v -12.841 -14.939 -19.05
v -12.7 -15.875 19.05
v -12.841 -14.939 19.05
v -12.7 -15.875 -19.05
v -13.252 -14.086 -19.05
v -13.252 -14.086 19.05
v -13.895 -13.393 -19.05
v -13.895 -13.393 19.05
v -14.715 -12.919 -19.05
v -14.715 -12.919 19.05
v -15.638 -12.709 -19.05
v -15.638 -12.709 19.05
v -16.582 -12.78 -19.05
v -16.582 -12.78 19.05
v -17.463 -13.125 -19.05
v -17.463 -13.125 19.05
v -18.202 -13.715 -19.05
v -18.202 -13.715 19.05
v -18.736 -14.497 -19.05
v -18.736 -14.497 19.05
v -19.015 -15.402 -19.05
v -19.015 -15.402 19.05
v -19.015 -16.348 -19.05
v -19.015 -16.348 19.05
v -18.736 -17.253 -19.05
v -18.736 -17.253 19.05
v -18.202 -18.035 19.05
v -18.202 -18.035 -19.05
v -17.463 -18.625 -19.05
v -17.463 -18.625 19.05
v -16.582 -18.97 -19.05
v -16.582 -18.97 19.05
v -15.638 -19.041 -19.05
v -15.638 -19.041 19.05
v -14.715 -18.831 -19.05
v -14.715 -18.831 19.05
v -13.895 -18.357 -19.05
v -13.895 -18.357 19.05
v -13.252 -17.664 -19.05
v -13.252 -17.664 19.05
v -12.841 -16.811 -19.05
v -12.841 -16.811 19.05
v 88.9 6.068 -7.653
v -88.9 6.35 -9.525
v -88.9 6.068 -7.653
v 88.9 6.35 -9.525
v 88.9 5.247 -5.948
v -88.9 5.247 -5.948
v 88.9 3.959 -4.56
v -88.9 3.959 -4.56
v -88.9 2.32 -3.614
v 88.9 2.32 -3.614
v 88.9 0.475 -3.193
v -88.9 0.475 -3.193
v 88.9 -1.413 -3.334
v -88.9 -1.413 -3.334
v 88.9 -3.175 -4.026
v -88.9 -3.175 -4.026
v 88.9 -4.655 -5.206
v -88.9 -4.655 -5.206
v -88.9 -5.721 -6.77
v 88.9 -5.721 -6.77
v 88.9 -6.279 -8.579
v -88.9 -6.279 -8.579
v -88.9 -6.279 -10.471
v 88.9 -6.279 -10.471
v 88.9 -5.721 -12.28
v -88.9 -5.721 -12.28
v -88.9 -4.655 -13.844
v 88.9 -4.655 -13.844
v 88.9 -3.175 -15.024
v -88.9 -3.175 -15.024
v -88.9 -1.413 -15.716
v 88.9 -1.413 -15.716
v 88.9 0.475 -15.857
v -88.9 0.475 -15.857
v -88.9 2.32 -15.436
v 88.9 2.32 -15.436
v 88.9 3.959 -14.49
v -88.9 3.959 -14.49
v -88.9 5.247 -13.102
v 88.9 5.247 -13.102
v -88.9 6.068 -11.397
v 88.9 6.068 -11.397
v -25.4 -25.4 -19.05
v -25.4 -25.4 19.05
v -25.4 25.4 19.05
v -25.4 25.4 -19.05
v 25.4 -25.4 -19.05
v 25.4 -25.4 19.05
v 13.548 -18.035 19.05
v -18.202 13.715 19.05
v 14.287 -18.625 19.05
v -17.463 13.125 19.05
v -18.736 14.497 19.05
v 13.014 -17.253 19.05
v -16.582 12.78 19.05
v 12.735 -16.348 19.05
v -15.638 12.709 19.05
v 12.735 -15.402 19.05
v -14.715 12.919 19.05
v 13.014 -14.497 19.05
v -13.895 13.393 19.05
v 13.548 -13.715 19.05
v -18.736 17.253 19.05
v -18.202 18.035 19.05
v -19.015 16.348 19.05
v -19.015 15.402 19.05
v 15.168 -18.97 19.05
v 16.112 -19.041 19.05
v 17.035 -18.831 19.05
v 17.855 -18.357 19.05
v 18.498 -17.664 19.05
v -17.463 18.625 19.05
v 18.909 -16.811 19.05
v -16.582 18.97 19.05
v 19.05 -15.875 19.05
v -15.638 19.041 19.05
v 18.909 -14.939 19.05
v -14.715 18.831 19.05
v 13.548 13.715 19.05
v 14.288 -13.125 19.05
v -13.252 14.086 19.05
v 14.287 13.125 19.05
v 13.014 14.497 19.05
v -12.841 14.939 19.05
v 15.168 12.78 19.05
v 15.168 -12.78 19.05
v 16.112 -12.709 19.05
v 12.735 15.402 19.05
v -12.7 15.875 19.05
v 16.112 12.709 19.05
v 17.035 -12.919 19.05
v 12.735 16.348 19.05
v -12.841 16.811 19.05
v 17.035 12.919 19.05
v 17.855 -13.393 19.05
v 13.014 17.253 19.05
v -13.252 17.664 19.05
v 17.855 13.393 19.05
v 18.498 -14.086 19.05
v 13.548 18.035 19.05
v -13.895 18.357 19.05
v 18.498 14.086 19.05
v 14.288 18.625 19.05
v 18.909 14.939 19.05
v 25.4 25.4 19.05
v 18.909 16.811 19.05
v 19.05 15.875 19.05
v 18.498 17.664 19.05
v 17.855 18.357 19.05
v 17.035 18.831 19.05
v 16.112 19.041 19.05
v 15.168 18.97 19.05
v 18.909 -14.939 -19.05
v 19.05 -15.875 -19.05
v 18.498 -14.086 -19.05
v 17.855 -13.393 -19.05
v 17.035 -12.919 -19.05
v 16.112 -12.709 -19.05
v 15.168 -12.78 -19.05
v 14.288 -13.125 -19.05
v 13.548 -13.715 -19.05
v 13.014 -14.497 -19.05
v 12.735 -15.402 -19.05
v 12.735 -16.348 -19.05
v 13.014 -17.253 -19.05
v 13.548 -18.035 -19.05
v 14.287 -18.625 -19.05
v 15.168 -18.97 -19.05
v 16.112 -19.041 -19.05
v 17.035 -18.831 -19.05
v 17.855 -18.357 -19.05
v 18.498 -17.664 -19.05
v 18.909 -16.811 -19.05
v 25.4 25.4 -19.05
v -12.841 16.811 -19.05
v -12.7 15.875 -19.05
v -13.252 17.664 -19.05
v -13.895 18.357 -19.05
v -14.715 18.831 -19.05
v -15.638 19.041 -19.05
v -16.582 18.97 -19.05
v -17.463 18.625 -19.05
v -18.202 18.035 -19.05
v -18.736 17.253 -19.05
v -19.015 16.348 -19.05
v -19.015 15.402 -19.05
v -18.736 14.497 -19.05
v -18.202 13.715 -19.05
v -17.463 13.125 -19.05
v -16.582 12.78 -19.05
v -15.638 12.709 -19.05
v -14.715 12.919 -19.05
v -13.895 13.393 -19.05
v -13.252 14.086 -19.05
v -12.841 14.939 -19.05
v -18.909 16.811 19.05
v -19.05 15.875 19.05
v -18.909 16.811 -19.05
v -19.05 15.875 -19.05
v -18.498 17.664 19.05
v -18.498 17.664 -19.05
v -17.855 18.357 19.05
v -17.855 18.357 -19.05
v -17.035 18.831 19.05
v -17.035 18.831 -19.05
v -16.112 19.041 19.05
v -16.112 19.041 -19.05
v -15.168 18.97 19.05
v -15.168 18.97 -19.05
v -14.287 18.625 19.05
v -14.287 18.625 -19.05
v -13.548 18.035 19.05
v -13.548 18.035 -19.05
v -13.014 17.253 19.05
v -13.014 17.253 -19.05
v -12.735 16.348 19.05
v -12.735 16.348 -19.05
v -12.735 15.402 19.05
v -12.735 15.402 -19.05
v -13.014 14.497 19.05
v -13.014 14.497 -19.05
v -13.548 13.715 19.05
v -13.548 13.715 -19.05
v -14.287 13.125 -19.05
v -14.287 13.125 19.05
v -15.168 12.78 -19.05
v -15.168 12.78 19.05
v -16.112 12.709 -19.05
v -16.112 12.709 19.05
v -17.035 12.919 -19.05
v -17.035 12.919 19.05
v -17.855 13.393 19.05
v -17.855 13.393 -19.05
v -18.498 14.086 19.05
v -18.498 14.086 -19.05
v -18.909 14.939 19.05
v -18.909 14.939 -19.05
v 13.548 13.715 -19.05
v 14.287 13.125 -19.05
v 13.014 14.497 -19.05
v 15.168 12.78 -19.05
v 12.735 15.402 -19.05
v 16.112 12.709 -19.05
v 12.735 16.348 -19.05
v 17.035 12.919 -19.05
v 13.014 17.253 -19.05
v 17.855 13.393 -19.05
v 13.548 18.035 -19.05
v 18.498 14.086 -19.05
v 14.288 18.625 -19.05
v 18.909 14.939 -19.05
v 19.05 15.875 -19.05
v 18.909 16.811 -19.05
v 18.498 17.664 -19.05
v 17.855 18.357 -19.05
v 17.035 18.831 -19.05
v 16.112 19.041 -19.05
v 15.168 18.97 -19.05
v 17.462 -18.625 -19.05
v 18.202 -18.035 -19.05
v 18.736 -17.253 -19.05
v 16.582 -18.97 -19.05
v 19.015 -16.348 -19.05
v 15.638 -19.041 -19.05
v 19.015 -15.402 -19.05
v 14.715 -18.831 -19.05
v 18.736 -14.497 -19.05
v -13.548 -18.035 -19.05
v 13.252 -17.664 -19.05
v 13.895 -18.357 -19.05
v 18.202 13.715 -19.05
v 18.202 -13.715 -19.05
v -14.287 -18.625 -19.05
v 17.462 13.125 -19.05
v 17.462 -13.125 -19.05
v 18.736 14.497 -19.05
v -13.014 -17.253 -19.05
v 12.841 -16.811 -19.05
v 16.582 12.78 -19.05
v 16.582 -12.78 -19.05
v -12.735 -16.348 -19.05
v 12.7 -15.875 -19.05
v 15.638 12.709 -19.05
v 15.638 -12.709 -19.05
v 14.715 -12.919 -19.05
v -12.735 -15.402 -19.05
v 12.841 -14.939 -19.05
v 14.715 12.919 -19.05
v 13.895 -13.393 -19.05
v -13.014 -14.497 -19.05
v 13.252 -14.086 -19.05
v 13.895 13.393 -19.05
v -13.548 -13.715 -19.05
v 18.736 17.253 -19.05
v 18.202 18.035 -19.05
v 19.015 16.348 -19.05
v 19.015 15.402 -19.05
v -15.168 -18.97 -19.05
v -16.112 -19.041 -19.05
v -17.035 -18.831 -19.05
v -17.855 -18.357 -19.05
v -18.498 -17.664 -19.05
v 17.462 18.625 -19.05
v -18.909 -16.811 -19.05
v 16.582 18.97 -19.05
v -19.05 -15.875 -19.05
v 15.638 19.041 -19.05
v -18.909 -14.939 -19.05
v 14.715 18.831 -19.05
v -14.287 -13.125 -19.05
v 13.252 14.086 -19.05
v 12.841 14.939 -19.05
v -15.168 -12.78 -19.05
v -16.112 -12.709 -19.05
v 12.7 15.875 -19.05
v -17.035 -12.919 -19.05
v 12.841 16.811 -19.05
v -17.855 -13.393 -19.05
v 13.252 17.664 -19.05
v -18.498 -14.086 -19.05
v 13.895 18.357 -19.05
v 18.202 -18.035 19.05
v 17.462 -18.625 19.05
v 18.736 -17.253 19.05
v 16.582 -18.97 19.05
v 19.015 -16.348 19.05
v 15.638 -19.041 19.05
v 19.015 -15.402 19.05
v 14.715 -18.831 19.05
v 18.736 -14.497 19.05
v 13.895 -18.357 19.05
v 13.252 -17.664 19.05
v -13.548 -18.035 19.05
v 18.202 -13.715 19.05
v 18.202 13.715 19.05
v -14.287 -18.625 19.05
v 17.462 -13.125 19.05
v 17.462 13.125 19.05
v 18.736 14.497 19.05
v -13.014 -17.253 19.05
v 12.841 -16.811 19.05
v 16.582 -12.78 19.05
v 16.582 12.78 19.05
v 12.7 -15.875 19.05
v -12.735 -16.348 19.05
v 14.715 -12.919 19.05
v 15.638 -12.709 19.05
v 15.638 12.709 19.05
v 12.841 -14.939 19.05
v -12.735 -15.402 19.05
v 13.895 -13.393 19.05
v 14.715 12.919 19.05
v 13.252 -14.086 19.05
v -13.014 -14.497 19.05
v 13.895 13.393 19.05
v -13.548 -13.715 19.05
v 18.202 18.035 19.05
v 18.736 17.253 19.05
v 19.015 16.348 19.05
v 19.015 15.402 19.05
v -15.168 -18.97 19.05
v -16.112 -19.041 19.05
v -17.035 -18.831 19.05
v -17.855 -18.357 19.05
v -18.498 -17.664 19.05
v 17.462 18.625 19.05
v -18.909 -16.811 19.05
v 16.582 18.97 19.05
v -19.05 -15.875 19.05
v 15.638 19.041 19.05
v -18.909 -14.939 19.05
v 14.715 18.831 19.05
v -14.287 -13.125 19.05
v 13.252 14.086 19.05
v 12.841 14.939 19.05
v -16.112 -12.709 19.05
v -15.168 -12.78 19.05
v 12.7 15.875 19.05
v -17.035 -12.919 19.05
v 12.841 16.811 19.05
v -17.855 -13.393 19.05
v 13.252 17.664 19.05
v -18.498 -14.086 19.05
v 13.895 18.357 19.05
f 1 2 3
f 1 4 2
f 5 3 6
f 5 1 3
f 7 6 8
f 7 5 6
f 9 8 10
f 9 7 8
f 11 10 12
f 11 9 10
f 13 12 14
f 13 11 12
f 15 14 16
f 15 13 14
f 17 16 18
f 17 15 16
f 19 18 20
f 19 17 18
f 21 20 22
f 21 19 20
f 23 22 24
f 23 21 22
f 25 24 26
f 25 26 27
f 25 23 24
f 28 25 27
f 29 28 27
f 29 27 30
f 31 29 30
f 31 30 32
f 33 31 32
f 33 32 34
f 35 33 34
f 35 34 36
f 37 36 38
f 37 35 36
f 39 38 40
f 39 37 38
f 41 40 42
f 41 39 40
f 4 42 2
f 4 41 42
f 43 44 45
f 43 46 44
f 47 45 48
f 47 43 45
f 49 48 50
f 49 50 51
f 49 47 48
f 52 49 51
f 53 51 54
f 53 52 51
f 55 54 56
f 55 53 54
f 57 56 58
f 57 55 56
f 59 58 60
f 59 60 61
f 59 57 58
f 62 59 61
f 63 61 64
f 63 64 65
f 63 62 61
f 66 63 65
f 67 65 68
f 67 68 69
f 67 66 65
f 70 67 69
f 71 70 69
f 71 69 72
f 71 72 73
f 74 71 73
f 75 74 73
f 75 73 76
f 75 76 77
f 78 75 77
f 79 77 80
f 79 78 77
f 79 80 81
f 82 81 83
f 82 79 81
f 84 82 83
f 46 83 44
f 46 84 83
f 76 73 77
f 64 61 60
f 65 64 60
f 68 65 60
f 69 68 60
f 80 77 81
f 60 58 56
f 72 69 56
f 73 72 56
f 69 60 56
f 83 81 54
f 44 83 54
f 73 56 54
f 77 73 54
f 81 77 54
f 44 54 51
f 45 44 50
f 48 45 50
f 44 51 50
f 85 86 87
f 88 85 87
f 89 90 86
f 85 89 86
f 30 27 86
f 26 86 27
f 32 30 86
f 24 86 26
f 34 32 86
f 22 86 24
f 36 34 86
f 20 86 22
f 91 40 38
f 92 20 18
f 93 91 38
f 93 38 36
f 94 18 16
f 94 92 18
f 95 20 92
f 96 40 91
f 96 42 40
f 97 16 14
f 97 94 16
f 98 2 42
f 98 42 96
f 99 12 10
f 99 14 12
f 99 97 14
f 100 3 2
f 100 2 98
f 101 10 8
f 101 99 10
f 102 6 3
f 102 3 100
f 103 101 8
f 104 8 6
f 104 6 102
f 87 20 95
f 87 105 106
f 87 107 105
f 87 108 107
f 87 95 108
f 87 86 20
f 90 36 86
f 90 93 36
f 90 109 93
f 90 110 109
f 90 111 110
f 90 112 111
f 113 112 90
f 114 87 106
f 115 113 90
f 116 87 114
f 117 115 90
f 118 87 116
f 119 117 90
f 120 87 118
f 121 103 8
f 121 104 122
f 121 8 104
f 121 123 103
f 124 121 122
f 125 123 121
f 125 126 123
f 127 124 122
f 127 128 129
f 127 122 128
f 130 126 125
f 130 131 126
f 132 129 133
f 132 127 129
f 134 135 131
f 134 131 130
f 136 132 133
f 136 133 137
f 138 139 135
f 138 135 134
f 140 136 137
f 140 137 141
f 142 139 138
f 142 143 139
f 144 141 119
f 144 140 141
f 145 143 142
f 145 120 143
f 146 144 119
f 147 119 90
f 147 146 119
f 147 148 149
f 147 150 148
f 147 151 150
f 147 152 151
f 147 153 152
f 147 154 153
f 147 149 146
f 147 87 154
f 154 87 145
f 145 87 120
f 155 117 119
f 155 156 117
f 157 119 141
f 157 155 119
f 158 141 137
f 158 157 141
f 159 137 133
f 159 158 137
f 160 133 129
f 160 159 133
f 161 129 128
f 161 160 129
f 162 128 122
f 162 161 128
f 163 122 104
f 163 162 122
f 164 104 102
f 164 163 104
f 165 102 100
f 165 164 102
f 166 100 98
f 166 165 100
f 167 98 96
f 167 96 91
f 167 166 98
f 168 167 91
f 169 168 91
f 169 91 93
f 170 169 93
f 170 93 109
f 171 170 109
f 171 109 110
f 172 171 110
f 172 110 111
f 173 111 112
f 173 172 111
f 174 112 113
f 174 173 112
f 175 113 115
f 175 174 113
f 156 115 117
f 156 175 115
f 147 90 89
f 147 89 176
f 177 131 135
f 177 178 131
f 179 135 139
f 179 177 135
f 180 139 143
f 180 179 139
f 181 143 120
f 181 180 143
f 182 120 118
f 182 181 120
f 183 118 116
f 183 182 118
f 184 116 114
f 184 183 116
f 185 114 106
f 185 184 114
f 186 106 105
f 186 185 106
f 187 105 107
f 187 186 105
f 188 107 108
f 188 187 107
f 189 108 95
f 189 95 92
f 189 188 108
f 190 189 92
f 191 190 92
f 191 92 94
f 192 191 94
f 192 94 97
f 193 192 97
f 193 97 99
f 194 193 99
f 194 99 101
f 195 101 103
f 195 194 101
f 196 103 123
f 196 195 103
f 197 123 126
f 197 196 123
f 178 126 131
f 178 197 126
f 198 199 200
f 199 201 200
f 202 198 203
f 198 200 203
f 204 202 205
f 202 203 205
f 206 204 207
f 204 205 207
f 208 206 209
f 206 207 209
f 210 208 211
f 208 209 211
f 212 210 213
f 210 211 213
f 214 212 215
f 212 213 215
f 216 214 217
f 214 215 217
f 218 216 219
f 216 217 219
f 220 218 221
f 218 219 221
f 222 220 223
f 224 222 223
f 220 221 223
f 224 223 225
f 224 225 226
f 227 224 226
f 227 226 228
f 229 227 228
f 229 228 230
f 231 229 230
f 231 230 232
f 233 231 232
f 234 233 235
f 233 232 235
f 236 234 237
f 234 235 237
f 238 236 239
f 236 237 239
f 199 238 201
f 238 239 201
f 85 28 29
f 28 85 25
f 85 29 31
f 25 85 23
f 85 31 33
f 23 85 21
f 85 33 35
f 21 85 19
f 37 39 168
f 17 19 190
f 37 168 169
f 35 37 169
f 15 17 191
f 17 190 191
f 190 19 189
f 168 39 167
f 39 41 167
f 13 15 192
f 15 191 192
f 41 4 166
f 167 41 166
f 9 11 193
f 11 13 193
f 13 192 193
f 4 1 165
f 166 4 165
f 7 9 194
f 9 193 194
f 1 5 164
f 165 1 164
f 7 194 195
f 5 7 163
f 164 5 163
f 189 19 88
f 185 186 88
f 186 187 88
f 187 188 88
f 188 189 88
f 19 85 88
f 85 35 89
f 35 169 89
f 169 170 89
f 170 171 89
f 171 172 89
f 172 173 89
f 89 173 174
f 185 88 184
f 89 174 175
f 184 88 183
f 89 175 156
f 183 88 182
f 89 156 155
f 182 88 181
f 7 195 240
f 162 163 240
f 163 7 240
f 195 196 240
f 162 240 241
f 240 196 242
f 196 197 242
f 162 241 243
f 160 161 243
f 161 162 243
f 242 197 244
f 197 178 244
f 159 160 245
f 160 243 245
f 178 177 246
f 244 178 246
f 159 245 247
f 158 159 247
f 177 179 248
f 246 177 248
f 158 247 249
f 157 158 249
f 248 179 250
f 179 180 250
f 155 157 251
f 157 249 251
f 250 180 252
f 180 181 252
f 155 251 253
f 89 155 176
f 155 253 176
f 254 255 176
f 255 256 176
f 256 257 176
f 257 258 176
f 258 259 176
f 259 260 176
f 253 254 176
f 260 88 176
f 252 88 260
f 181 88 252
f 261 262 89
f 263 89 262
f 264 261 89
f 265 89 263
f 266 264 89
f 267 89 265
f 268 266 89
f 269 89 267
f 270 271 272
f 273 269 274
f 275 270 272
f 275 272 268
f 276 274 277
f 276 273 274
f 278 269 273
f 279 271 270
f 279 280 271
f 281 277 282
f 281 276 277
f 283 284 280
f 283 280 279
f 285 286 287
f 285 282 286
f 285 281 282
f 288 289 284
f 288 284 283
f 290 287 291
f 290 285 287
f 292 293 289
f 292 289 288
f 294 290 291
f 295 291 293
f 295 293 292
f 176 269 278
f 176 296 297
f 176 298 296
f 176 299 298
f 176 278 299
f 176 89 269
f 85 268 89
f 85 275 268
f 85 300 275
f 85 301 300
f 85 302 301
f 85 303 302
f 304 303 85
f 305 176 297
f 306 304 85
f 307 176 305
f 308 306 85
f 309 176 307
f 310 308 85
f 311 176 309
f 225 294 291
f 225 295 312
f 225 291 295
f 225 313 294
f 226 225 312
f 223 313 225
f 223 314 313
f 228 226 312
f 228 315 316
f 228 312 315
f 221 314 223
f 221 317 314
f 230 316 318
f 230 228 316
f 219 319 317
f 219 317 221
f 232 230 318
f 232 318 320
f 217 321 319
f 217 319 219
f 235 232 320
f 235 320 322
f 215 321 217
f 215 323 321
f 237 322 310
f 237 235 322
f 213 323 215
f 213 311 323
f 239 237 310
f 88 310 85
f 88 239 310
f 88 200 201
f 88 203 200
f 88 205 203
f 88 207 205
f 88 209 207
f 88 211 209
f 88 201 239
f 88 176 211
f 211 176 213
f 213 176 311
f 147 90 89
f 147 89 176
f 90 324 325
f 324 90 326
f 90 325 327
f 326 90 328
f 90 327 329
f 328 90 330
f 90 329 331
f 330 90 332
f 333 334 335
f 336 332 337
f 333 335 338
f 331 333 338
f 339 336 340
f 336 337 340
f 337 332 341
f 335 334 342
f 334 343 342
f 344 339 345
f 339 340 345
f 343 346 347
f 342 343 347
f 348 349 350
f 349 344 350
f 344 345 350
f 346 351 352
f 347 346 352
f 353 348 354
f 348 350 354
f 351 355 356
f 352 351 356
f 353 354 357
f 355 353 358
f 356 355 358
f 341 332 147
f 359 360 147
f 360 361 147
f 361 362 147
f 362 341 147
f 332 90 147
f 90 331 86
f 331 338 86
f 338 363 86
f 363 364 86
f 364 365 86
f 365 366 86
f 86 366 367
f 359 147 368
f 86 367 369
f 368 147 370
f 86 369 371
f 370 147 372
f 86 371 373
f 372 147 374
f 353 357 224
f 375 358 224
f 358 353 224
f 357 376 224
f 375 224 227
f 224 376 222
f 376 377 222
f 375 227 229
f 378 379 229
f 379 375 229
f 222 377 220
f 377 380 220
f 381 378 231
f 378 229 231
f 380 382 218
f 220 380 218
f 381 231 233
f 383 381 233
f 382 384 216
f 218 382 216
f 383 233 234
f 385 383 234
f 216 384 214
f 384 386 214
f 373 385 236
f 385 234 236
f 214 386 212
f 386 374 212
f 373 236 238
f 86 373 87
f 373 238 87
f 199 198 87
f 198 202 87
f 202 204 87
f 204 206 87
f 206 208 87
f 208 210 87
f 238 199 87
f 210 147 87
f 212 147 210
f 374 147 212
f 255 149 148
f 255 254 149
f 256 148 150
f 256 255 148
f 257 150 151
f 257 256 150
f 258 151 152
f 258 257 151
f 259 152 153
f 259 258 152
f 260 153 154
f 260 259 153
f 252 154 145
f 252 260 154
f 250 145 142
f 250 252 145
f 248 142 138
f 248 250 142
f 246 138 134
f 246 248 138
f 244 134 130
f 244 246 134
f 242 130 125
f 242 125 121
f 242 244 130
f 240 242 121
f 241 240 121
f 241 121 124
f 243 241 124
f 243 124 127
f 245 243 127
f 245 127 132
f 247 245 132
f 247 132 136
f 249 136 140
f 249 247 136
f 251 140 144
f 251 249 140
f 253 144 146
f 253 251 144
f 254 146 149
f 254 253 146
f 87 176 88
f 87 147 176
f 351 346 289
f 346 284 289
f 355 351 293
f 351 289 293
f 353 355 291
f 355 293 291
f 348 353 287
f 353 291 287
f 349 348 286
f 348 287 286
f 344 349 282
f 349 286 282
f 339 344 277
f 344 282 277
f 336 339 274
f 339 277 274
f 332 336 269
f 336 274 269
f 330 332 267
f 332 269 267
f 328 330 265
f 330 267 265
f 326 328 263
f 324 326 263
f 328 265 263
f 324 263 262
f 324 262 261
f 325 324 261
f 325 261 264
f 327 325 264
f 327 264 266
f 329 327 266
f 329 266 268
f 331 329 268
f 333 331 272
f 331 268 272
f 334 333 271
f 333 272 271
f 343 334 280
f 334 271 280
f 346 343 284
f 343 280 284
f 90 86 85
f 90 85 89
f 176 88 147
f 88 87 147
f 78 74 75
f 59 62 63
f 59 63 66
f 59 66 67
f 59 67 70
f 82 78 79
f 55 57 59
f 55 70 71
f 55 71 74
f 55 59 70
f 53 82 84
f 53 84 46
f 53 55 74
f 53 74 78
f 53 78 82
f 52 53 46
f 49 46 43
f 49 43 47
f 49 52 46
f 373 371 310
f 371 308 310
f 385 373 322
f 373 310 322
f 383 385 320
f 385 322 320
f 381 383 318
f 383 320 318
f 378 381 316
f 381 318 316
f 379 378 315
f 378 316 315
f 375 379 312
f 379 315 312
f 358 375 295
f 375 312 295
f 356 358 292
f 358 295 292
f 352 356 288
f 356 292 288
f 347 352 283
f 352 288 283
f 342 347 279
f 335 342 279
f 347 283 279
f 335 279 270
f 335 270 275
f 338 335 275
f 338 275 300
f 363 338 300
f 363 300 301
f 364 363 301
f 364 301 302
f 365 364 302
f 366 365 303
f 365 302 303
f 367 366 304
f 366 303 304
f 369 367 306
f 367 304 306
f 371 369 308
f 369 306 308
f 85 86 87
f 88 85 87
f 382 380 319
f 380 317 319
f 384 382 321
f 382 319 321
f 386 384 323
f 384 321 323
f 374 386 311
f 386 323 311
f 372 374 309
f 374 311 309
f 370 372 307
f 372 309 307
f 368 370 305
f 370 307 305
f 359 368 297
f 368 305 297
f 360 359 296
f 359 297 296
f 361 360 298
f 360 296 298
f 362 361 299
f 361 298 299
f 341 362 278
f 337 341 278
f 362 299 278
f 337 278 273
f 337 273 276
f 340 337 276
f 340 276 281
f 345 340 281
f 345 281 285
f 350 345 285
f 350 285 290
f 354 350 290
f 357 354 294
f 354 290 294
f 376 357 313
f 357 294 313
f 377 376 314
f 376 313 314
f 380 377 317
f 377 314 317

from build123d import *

# Parameters (mm, degrees)
F0_W     = 50.8
F0_H     = 50.8
F0_R     = 3.175
F1_DEPTH = 19.05
F3_R     = 6.35
F4_DEPTH = 88.9


with BuildPart() as f1:
    # F0 (on Top) → F1 (new body, symmetric)
    with BuildSketch(Plane.XY):
        Rectangle(F0_W, F0_H)
        with Locations((-15.875, -15.875)):
            Circle(F0_R, mode=Mode.SUBTRACT)
        with Locations((15.875, -15.875)):
            Circle(F0_R, mode=Mode.SUBTRACT)
        with Locations((-15.875, 15.875)):
            Circle(F0_R, mode=Mode.SUBTRACT)
        with Locations((15.875, 15.875)):
            Circle(F0_R, mode=Mode.SUBTRACT)
    extrude(amount=F1_DEPTH, both=True)


with BuildPart() as f2_1:
    # F2: instance of F1
    add(f1.part.mirror(Plane.YZ))


with BuildPart() as f4:
    # F3 (on Right) → F4 (new body, symmetric)
    with BuildSketch(Plane.YZ):
        with Locations((0, -9.525)):
            Circle(F3_R)
    extrude(amount=F4_DEPTH, both=True)


solid = Compound([f1.part, f2_1.part, f4.part])
